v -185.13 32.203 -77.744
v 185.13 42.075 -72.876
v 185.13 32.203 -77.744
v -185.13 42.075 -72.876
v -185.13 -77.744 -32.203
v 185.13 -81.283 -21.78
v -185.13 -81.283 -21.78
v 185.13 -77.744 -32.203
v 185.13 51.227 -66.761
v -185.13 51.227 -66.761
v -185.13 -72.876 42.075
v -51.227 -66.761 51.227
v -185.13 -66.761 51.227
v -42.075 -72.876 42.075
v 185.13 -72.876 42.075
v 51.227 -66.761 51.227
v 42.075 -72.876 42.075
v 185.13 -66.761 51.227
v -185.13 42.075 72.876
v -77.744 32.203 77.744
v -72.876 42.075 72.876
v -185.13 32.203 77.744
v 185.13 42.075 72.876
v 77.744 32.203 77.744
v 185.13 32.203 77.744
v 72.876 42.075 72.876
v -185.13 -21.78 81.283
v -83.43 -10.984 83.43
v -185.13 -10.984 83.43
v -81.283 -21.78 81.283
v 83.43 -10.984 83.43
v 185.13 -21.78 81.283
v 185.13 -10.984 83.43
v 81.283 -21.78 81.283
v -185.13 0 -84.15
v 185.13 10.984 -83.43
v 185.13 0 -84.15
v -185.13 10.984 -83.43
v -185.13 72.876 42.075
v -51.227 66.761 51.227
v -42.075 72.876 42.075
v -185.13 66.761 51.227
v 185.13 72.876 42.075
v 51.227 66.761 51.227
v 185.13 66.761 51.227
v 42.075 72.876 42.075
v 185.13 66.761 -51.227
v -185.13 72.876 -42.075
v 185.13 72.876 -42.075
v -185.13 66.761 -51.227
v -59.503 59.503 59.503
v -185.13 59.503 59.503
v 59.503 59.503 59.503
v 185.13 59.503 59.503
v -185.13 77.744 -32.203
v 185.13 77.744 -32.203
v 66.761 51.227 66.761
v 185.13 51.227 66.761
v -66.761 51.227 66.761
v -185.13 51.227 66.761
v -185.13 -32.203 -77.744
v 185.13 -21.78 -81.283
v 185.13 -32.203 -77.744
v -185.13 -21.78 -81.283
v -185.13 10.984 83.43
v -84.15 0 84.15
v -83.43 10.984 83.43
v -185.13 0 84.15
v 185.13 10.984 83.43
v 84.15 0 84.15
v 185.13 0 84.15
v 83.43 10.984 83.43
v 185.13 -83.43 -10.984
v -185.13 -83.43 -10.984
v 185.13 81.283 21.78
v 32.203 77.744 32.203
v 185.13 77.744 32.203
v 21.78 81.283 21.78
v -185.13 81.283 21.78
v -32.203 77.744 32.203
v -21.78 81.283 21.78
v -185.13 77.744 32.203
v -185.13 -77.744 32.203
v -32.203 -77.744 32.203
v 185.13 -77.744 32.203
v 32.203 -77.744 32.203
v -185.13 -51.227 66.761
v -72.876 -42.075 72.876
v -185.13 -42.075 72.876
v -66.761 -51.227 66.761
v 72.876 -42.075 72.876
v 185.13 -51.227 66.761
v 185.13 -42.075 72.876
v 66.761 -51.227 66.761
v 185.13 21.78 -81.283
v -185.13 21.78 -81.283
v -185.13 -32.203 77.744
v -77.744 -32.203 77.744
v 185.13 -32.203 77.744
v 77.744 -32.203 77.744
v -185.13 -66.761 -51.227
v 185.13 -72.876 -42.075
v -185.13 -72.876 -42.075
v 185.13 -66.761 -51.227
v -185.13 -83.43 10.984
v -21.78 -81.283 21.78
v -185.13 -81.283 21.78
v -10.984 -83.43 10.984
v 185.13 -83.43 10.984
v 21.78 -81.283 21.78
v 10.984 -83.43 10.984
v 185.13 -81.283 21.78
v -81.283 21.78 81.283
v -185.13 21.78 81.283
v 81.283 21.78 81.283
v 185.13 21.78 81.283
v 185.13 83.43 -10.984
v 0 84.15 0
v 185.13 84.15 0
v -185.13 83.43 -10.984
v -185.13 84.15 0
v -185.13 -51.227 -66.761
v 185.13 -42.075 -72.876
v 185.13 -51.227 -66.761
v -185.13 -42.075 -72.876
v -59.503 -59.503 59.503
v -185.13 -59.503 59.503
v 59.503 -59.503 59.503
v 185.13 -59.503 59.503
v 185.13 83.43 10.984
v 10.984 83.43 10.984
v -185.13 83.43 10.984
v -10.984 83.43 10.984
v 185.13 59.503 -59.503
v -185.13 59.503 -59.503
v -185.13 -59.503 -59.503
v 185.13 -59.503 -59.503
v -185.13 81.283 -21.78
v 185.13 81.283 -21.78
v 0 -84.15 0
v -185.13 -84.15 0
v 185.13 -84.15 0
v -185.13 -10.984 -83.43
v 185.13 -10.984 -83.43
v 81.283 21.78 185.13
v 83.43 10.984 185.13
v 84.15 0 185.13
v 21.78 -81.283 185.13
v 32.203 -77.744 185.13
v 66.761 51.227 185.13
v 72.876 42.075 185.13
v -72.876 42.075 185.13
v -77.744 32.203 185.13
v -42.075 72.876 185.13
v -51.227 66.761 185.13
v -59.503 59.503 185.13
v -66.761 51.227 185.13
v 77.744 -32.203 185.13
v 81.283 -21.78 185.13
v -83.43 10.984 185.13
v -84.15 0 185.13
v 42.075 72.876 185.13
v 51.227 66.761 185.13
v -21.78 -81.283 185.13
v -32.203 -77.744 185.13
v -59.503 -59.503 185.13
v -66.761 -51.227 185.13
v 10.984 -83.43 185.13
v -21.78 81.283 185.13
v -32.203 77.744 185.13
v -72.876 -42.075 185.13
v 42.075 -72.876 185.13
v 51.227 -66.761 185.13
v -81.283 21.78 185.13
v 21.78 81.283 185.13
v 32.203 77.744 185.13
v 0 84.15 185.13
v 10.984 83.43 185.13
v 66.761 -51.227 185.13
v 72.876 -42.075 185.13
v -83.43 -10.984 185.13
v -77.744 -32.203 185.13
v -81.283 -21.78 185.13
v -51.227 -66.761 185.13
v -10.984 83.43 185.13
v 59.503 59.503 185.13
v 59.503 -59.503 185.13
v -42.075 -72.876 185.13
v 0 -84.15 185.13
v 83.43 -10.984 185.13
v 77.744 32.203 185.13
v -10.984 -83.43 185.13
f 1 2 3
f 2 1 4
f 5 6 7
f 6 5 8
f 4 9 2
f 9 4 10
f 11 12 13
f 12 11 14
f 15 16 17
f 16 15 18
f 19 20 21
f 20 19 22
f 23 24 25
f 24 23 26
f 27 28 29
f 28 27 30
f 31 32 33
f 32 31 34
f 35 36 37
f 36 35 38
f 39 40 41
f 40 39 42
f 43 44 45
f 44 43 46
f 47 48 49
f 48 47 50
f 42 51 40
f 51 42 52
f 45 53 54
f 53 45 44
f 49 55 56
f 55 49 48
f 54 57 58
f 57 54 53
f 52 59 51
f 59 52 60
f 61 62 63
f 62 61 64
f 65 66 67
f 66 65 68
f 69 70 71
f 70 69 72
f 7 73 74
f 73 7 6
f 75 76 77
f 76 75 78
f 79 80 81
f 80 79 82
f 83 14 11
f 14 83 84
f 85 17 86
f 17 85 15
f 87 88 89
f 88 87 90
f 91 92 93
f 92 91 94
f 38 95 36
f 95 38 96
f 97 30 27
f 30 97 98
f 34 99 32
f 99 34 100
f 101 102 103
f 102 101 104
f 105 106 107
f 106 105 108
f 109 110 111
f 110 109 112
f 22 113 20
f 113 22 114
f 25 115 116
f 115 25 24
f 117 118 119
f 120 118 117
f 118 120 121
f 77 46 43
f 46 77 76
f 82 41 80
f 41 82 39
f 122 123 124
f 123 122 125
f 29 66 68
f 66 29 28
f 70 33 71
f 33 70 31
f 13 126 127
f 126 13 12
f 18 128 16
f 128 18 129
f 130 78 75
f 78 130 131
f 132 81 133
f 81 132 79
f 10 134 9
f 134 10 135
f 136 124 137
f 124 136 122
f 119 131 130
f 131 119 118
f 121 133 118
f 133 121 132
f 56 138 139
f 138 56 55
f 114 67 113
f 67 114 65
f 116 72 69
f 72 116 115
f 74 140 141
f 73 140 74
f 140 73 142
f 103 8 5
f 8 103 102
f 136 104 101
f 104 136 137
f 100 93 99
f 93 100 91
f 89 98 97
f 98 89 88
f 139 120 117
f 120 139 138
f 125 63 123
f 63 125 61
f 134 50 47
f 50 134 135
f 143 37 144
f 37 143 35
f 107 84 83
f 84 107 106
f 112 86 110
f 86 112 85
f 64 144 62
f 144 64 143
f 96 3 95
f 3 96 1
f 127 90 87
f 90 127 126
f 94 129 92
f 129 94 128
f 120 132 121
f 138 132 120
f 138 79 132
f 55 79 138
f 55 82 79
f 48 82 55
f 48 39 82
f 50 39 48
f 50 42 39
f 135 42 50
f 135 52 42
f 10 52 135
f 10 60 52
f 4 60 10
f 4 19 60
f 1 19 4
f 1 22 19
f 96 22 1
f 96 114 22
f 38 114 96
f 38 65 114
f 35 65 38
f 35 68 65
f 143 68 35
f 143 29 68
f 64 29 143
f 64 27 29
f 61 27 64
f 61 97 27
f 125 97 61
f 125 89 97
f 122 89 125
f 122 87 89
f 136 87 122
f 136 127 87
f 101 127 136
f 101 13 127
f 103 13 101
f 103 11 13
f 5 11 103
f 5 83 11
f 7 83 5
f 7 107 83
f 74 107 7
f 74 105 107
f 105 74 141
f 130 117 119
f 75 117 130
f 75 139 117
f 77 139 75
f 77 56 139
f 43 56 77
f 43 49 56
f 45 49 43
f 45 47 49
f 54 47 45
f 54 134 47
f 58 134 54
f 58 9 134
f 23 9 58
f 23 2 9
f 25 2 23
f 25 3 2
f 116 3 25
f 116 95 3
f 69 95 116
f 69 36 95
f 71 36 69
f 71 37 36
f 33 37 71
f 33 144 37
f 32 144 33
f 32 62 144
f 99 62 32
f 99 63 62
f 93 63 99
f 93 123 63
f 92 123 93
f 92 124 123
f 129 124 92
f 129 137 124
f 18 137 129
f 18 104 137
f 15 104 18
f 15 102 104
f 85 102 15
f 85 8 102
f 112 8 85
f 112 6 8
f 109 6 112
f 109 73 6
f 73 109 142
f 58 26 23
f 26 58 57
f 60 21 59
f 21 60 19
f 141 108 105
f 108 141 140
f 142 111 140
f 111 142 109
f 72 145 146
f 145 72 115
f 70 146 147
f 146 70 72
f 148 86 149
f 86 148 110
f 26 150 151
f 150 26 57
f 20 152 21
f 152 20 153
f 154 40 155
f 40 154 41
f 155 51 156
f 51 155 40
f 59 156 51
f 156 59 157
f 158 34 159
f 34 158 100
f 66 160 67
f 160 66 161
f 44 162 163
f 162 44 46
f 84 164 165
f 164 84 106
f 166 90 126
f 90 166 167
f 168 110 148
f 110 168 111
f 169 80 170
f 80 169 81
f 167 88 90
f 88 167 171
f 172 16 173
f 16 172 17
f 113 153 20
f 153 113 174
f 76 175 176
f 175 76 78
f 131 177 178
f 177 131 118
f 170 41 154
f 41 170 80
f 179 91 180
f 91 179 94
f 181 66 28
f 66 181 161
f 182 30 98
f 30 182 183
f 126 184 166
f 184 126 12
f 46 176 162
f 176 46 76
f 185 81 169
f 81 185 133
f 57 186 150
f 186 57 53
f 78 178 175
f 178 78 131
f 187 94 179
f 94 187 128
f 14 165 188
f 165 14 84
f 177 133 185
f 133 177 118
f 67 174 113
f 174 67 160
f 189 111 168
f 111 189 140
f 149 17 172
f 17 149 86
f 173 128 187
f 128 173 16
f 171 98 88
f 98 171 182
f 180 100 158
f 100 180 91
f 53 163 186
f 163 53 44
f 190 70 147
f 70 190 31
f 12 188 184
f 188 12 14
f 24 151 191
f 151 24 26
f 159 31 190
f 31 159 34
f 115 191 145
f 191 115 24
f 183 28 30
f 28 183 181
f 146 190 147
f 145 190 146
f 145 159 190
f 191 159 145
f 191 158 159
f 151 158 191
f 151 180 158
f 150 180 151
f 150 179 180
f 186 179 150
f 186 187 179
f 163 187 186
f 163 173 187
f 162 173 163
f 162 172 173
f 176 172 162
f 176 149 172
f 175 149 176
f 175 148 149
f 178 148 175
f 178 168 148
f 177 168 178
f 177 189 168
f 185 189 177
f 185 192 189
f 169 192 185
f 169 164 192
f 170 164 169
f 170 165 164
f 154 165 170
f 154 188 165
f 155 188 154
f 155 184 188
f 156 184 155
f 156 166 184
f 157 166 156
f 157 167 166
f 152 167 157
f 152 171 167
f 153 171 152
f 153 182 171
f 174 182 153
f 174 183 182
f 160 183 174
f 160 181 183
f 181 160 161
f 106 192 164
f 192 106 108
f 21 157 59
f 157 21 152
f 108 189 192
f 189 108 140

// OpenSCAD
// Auto-generated by scripts/author_from_manifest.py (Phase D.3).
// Source: data/phase_d_manifest.json (sku_intent='anvil-reducing-tee-threaded-6x4in').
// Do not hand-edit — regenerate from the manifest.
//
// @part anvil_reducing_tee_threaded_6x4in
// @kind fitting
// @category fitting.tee
// @display-name "Anvil FIG 10 Threaded Reducing Tee 6\" x 4\""
// @mfg anvil_international
// @mfg-pn FIG_10_6x4
// @listing UL FM
// @price-usd 40.00
// @install-minutes 6
// @crew journeyman
// @param size_in number default=6 label="Size" unit="in"
// @port run_in position=[-0.05,0,0] direction=[-1,0,0] style=grooved size_in=6 role=run_a
// @port run_out position=[0.05,0,0] direction=[1,0,0] style=grooved size_in=6 role=run_b
// @port branch position=[0,0,0.05] direction=[0,0,1] style=grooved size_in=6 role=branch

size_in = 6.0;

function od_mm(nps) =
    nps ==   1  ? 33.4 :
    nps == 1.25 ? 42.2 :
    nps == 1.5  ? 48.3 :
    nps ==   2  ? 60.3 :
    nps == 2.5  ? 73.0 :
    nps ==   3  ? 88.9 :
    nps ==   4  ? 114.3 :
    nps ==   5  ? 141.3 :
    nps ==   6  ? 168.3 :
    nps ==   8  ? 219.1 :
    nps ==  10  ? 273.0 : 60.3;

od = od_mm(size_in);
run_len    = od * 2.2;
branch_len = od * 1.1;

union() {
    // Run along X
    rotate([0, 90, 0])
        cylinder(h = run_len, d = od, center = true, $fn = 48);
    // Branch along +Z
    translate([0, 0, branch_len/2])
        cylinder(h = branch_len, d = od, center = true, $fn = 48);
}
